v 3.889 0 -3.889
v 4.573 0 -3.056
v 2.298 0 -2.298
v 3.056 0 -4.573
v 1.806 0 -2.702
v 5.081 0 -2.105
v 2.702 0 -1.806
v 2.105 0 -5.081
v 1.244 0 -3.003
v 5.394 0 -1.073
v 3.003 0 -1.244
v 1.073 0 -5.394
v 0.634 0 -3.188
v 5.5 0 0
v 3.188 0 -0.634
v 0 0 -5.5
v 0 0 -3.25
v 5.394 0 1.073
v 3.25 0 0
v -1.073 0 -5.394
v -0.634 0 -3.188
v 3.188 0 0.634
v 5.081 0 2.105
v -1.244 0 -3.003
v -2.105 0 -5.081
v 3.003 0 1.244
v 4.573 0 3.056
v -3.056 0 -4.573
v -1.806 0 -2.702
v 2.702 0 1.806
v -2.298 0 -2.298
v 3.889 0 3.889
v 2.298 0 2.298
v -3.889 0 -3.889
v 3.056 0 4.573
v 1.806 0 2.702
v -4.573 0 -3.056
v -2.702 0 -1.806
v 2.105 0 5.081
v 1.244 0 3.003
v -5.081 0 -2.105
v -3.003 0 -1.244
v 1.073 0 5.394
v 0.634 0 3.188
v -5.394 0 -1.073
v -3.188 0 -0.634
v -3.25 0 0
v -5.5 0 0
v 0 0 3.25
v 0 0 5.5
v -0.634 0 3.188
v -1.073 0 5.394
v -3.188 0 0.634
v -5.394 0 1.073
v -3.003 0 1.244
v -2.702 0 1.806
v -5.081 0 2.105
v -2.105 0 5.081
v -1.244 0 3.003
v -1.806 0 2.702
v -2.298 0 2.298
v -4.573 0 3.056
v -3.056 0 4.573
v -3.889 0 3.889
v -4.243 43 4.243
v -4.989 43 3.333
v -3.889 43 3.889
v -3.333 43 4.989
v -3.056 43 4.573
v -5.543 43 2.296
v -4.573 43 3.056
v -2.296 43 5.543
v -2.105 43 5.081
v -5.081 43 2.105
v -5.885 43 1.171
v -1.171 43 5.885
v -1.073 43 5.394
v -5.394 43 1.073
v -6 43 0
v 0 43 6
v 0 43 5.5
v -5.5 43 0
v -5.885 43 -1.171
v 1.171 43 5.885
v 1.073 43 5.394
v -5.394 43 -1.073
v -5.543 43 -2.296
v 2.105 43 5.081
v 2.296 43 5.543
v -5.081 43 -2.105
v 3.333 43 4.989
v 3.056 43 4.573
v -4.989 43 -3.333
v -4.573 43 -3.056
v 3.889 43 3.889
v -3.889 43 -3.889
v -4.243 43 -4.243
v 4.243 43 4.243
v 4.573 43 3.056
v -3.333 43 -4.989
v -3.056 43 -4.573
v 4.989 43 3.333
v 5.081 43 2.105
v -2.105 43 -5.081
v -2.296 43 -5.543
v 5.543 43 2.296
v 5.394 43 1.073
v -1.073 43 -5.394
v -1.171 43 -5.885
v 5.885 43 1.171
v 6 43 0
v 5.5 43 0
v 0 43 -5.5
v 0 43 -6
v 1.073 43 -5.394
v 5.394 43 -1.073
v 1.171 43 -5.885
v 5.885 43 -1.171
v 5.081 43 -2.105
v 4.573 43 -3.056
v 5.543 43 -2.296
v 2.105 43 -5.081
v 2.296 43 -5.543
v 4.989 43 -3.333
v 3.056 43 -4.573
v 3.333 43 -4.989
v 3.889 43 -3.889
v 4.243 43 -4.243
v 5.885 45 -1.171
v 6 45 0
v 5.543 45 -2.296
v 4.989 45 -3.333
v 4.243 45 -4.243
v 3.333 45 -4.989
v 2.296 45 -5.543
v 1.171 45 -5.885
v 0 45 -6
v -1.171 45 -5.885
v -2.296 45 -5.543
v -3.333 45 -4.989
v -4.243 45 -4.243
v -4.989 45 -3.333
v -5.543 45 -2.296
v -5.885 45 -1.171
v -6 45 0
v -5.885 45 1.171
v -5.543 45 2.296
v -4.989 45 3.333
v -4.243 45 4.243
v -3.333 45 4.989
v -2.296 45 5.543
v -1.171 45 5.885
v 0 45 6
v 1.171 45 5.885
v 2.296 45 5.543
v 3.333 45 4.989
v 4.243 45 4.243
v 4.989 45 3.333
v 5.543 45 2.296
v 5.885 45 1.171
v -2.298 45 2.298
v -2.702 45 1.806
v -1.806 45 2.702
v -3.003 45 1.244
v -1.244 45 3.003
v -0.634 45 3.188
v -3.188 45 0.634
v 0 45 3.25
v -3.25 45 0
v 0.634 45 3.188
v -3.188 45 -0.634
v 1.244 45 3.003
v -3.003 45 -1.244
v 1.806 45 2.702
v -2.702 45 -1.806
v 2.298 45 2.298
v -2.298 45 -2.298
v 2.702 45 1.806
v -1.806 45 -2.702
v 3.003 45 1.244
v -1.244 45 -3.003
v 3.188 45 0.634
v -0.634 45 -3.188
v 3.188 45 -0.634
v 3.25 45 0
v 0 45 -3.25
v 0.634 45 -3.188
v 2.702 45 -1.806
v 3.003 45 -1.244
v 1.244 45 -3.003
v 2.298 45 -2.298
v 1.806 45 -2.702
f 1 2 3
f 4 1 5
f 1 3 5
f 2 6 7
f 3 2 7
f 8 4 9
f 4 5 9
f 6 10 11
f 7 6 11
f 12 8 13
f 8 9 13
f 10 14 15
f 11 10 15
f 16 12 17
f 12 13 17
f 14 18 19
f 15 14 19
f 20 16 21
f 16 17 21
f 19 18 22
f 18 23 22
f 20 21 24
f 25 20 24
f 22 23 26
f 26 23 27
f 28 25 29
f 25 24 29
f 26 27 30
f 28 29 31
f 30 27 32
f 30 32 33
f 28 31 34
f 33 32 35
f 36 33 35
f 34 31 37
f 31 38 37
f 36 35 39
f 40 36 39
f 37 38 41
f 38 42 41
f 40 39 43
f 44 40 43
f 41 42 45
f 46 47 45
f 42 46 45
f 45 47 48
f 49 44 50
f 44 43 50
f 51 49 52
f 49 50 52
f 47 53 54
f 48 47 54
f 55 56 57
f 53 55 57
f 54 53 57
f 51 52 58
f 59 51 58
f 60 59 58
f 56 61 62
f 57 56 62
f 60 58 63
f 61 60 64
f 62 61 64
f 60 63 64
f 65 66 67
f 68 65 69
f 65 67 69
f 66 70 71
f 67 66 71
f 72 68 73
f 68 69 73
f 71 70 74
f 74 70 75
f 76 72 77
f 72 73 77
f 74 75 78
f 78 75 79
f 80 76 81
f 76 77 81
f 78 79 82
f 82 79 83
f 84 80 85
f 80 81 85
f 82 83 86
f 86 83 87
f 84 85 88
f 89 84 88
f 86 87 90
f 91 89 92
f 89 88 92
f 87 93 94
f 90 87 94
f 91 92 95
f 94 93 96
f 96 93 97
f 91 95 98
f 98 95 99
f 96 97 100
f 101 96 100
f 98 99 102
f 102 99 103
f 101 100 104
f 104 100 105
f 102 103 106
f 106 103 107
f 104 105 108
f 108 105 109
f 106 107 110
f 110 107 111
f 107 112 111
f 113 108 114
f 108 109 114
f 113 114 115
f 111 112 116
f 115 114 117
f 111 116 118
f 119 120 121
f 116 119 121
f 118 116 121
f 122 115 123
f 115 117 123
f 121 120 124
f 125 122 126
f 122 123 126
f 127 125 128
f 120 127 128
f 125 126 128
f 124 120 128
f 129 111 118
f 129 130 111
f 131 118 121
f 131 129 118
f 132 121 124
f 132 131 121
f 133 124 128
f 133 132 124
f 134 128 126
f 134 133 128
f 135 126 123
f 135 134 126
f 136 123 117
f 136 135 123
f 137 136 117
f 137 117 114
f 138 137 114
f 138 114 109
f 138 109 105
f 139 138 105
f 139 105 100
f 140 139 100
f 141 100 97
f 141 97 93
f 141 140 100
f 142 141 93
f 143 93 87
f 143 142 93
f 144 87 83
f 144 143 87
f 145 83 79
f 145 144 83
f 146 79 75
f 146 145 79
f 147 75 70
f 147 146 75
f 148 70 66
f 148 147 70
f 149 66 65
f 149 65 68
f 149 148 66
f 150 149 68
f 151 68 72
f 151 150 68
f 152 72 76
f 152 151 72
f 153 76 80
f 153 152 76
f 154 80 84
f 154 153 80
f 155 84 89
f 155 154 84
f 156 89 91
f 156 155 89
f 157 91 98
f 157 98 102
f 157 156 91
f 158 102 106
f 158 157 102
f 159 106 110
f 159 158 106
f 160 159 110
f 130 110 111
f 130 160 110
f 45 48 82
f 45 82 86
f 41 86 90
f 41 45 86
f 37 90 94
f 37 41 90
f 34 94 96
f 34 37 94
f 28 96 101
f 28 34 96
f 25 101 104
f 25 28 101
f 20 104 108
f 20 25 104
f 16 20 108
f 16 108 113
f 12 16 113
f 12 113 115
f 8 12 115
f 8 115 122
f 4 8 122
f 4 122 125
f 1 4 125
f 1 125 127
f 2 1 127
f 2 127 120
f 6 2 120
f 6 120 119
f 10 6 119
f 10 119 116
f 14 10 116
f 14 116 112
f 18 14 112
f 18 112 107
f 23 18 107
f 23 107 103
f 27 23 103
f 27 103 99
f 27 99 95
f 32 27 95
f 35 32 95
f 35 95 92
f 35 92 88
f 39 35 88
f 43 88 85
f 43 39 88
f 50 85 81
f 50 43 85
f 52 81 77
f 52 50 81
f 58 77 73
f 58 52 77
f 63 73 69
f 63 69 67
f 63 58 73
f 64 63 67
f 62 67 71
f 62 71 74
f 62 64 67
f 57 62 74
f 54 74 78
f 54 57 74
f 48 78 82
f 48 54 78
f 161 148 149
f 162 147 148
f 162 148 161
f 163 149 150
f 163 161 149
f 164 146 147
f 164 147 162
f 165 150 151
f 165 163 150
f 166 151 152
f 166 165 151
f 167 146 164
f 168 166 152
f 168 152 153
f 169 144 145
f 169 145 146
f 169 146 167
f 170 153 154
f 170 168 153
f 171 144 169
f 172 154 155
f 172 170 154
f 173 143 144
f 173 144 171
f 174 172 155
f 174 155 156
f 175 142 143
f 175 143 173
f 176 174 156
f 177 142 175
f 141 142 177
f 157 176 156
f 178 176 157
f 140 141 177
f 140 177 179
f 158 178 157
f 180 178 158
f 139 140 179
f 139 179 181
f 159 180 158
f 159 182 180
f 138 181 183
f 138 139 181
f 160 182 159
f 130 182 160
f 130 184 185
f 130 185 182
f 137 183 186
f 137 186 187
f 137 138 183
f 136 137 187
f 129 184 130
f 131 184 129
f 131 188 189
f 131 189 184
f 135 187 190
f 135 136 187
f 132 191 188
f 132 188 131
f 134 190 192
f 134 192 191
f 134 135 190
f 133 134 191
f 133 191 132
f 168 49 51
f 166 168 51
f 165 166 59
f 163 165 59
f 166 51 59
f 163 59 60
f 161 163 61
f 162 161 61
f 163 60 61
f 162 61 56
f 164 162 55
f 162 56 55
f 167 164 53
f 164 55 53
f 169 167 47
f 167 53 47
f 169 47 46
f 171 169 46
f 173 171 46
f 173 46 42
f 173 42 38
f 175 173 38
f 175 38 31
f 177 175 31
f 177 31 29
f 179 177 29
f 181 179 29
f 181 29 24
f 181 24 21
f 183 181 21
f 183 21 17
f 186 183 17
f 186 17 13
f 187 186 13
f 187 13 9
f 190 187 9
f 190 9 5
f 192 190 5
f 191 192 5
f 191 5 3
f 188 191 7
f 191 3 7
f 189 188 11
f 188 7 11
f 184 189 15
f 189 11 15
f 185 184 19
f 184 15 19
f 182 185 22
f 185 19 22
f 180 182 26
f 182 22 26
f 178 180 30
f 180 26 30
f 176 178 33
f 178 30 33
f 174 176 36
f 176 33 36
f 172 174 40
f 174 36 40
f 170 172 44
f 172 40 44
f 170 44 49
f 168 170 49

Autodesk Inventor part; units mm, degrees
ref_plane "YZ Plane" through (0, 0, 0) normal (1, 0, 0) x (0, 1, 0)
ref_plane "XZ Plane" through (0, 0, 0) normal (0, 1, 0) x (-1, 0, 0)
ref_plane "XY Plane" through (0, 0, 0) normal (0, 0, 1) x (1, 0, 0)
sketch "Szkic1" plane through (0, 0, 0) normal (0, 1, 0) x (-1, 0, 0)
  circle A0 centre (0, 0) radius 5.5
  dimension "d0" = 11
extrude "Wyciągnięcie proste1" add sketch "Szkic1" along normal blind 45
sketch "Szkic2" plane through (0, 45, 0) normal (0, 1, 0) x (1, 0, 0)
  circle A0 centre (0, 0) radius 6
  dimension "d3" = 12
extrude "Wyciągnięcie proste2" add sketch "Szkic2" against normal blind 2
sketch "Szkic3" plane through (0, 45, 0) normal (0, 1, 0) x (1, 0, 0)
  point P0 (0, 0)
  point P1 (0, 0)
hole "Otwór1" at (0, 45, 0) direction (0, -1, 0) diameter 6.5 end through all
properties part number "Jack_srodek"
